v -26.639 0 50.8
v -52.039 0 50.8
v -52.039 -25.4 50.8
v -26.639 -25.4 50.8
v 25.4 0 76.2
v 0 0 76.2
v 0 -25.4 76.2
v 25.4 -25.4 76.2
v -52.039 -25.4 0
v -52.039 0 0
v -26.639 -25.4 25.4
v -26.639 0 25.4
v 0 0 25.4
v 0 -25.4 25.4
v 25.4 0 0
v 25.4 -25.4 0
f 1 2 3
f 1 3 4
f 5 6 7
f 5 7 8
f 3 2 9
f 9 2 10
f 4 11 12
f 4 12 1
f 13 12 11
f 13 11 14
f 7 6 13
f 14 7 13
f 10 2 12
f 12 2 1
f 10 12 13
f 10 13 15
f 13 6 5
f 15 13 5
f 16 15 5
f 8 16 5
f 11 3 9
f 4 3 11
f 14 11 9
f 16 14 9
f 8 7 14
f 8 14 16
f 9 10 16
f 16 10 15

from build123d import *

# Parameters (mm, degrees)
F0_W     = 25.4
F0_H     = 25.4
F0_W_2   = 26.6390249144
F2_DEPTH = 25.4


with BuildPart() as f2:
    # F0 (on Front) → F2 (new body)
    with BuildSketch(Plane.XZ):
        with Locations((-39.3390249144, 38.1)):
            Rectangle(F0_W, F0_H)
        with Locations((-39.3390249144, 12.7)):
            Rectangle(F0_W, F0_H)
        with Locations((-13.3195124572, 12.7)):
            Rectangle(F0_W_2, F0_H)
        with Locations((12.7, 63.5)):
            Rectangle(F0_W, F0_H)
        with Locations((12.7, 38.1)):
            Rectangle(F0_W, F0_H)
        with Locations((12.7, 12.7)):
            Rectangle(F0_W, F0_H)
    extrude(amount=F2_DEPTH)


solid = f2.part
